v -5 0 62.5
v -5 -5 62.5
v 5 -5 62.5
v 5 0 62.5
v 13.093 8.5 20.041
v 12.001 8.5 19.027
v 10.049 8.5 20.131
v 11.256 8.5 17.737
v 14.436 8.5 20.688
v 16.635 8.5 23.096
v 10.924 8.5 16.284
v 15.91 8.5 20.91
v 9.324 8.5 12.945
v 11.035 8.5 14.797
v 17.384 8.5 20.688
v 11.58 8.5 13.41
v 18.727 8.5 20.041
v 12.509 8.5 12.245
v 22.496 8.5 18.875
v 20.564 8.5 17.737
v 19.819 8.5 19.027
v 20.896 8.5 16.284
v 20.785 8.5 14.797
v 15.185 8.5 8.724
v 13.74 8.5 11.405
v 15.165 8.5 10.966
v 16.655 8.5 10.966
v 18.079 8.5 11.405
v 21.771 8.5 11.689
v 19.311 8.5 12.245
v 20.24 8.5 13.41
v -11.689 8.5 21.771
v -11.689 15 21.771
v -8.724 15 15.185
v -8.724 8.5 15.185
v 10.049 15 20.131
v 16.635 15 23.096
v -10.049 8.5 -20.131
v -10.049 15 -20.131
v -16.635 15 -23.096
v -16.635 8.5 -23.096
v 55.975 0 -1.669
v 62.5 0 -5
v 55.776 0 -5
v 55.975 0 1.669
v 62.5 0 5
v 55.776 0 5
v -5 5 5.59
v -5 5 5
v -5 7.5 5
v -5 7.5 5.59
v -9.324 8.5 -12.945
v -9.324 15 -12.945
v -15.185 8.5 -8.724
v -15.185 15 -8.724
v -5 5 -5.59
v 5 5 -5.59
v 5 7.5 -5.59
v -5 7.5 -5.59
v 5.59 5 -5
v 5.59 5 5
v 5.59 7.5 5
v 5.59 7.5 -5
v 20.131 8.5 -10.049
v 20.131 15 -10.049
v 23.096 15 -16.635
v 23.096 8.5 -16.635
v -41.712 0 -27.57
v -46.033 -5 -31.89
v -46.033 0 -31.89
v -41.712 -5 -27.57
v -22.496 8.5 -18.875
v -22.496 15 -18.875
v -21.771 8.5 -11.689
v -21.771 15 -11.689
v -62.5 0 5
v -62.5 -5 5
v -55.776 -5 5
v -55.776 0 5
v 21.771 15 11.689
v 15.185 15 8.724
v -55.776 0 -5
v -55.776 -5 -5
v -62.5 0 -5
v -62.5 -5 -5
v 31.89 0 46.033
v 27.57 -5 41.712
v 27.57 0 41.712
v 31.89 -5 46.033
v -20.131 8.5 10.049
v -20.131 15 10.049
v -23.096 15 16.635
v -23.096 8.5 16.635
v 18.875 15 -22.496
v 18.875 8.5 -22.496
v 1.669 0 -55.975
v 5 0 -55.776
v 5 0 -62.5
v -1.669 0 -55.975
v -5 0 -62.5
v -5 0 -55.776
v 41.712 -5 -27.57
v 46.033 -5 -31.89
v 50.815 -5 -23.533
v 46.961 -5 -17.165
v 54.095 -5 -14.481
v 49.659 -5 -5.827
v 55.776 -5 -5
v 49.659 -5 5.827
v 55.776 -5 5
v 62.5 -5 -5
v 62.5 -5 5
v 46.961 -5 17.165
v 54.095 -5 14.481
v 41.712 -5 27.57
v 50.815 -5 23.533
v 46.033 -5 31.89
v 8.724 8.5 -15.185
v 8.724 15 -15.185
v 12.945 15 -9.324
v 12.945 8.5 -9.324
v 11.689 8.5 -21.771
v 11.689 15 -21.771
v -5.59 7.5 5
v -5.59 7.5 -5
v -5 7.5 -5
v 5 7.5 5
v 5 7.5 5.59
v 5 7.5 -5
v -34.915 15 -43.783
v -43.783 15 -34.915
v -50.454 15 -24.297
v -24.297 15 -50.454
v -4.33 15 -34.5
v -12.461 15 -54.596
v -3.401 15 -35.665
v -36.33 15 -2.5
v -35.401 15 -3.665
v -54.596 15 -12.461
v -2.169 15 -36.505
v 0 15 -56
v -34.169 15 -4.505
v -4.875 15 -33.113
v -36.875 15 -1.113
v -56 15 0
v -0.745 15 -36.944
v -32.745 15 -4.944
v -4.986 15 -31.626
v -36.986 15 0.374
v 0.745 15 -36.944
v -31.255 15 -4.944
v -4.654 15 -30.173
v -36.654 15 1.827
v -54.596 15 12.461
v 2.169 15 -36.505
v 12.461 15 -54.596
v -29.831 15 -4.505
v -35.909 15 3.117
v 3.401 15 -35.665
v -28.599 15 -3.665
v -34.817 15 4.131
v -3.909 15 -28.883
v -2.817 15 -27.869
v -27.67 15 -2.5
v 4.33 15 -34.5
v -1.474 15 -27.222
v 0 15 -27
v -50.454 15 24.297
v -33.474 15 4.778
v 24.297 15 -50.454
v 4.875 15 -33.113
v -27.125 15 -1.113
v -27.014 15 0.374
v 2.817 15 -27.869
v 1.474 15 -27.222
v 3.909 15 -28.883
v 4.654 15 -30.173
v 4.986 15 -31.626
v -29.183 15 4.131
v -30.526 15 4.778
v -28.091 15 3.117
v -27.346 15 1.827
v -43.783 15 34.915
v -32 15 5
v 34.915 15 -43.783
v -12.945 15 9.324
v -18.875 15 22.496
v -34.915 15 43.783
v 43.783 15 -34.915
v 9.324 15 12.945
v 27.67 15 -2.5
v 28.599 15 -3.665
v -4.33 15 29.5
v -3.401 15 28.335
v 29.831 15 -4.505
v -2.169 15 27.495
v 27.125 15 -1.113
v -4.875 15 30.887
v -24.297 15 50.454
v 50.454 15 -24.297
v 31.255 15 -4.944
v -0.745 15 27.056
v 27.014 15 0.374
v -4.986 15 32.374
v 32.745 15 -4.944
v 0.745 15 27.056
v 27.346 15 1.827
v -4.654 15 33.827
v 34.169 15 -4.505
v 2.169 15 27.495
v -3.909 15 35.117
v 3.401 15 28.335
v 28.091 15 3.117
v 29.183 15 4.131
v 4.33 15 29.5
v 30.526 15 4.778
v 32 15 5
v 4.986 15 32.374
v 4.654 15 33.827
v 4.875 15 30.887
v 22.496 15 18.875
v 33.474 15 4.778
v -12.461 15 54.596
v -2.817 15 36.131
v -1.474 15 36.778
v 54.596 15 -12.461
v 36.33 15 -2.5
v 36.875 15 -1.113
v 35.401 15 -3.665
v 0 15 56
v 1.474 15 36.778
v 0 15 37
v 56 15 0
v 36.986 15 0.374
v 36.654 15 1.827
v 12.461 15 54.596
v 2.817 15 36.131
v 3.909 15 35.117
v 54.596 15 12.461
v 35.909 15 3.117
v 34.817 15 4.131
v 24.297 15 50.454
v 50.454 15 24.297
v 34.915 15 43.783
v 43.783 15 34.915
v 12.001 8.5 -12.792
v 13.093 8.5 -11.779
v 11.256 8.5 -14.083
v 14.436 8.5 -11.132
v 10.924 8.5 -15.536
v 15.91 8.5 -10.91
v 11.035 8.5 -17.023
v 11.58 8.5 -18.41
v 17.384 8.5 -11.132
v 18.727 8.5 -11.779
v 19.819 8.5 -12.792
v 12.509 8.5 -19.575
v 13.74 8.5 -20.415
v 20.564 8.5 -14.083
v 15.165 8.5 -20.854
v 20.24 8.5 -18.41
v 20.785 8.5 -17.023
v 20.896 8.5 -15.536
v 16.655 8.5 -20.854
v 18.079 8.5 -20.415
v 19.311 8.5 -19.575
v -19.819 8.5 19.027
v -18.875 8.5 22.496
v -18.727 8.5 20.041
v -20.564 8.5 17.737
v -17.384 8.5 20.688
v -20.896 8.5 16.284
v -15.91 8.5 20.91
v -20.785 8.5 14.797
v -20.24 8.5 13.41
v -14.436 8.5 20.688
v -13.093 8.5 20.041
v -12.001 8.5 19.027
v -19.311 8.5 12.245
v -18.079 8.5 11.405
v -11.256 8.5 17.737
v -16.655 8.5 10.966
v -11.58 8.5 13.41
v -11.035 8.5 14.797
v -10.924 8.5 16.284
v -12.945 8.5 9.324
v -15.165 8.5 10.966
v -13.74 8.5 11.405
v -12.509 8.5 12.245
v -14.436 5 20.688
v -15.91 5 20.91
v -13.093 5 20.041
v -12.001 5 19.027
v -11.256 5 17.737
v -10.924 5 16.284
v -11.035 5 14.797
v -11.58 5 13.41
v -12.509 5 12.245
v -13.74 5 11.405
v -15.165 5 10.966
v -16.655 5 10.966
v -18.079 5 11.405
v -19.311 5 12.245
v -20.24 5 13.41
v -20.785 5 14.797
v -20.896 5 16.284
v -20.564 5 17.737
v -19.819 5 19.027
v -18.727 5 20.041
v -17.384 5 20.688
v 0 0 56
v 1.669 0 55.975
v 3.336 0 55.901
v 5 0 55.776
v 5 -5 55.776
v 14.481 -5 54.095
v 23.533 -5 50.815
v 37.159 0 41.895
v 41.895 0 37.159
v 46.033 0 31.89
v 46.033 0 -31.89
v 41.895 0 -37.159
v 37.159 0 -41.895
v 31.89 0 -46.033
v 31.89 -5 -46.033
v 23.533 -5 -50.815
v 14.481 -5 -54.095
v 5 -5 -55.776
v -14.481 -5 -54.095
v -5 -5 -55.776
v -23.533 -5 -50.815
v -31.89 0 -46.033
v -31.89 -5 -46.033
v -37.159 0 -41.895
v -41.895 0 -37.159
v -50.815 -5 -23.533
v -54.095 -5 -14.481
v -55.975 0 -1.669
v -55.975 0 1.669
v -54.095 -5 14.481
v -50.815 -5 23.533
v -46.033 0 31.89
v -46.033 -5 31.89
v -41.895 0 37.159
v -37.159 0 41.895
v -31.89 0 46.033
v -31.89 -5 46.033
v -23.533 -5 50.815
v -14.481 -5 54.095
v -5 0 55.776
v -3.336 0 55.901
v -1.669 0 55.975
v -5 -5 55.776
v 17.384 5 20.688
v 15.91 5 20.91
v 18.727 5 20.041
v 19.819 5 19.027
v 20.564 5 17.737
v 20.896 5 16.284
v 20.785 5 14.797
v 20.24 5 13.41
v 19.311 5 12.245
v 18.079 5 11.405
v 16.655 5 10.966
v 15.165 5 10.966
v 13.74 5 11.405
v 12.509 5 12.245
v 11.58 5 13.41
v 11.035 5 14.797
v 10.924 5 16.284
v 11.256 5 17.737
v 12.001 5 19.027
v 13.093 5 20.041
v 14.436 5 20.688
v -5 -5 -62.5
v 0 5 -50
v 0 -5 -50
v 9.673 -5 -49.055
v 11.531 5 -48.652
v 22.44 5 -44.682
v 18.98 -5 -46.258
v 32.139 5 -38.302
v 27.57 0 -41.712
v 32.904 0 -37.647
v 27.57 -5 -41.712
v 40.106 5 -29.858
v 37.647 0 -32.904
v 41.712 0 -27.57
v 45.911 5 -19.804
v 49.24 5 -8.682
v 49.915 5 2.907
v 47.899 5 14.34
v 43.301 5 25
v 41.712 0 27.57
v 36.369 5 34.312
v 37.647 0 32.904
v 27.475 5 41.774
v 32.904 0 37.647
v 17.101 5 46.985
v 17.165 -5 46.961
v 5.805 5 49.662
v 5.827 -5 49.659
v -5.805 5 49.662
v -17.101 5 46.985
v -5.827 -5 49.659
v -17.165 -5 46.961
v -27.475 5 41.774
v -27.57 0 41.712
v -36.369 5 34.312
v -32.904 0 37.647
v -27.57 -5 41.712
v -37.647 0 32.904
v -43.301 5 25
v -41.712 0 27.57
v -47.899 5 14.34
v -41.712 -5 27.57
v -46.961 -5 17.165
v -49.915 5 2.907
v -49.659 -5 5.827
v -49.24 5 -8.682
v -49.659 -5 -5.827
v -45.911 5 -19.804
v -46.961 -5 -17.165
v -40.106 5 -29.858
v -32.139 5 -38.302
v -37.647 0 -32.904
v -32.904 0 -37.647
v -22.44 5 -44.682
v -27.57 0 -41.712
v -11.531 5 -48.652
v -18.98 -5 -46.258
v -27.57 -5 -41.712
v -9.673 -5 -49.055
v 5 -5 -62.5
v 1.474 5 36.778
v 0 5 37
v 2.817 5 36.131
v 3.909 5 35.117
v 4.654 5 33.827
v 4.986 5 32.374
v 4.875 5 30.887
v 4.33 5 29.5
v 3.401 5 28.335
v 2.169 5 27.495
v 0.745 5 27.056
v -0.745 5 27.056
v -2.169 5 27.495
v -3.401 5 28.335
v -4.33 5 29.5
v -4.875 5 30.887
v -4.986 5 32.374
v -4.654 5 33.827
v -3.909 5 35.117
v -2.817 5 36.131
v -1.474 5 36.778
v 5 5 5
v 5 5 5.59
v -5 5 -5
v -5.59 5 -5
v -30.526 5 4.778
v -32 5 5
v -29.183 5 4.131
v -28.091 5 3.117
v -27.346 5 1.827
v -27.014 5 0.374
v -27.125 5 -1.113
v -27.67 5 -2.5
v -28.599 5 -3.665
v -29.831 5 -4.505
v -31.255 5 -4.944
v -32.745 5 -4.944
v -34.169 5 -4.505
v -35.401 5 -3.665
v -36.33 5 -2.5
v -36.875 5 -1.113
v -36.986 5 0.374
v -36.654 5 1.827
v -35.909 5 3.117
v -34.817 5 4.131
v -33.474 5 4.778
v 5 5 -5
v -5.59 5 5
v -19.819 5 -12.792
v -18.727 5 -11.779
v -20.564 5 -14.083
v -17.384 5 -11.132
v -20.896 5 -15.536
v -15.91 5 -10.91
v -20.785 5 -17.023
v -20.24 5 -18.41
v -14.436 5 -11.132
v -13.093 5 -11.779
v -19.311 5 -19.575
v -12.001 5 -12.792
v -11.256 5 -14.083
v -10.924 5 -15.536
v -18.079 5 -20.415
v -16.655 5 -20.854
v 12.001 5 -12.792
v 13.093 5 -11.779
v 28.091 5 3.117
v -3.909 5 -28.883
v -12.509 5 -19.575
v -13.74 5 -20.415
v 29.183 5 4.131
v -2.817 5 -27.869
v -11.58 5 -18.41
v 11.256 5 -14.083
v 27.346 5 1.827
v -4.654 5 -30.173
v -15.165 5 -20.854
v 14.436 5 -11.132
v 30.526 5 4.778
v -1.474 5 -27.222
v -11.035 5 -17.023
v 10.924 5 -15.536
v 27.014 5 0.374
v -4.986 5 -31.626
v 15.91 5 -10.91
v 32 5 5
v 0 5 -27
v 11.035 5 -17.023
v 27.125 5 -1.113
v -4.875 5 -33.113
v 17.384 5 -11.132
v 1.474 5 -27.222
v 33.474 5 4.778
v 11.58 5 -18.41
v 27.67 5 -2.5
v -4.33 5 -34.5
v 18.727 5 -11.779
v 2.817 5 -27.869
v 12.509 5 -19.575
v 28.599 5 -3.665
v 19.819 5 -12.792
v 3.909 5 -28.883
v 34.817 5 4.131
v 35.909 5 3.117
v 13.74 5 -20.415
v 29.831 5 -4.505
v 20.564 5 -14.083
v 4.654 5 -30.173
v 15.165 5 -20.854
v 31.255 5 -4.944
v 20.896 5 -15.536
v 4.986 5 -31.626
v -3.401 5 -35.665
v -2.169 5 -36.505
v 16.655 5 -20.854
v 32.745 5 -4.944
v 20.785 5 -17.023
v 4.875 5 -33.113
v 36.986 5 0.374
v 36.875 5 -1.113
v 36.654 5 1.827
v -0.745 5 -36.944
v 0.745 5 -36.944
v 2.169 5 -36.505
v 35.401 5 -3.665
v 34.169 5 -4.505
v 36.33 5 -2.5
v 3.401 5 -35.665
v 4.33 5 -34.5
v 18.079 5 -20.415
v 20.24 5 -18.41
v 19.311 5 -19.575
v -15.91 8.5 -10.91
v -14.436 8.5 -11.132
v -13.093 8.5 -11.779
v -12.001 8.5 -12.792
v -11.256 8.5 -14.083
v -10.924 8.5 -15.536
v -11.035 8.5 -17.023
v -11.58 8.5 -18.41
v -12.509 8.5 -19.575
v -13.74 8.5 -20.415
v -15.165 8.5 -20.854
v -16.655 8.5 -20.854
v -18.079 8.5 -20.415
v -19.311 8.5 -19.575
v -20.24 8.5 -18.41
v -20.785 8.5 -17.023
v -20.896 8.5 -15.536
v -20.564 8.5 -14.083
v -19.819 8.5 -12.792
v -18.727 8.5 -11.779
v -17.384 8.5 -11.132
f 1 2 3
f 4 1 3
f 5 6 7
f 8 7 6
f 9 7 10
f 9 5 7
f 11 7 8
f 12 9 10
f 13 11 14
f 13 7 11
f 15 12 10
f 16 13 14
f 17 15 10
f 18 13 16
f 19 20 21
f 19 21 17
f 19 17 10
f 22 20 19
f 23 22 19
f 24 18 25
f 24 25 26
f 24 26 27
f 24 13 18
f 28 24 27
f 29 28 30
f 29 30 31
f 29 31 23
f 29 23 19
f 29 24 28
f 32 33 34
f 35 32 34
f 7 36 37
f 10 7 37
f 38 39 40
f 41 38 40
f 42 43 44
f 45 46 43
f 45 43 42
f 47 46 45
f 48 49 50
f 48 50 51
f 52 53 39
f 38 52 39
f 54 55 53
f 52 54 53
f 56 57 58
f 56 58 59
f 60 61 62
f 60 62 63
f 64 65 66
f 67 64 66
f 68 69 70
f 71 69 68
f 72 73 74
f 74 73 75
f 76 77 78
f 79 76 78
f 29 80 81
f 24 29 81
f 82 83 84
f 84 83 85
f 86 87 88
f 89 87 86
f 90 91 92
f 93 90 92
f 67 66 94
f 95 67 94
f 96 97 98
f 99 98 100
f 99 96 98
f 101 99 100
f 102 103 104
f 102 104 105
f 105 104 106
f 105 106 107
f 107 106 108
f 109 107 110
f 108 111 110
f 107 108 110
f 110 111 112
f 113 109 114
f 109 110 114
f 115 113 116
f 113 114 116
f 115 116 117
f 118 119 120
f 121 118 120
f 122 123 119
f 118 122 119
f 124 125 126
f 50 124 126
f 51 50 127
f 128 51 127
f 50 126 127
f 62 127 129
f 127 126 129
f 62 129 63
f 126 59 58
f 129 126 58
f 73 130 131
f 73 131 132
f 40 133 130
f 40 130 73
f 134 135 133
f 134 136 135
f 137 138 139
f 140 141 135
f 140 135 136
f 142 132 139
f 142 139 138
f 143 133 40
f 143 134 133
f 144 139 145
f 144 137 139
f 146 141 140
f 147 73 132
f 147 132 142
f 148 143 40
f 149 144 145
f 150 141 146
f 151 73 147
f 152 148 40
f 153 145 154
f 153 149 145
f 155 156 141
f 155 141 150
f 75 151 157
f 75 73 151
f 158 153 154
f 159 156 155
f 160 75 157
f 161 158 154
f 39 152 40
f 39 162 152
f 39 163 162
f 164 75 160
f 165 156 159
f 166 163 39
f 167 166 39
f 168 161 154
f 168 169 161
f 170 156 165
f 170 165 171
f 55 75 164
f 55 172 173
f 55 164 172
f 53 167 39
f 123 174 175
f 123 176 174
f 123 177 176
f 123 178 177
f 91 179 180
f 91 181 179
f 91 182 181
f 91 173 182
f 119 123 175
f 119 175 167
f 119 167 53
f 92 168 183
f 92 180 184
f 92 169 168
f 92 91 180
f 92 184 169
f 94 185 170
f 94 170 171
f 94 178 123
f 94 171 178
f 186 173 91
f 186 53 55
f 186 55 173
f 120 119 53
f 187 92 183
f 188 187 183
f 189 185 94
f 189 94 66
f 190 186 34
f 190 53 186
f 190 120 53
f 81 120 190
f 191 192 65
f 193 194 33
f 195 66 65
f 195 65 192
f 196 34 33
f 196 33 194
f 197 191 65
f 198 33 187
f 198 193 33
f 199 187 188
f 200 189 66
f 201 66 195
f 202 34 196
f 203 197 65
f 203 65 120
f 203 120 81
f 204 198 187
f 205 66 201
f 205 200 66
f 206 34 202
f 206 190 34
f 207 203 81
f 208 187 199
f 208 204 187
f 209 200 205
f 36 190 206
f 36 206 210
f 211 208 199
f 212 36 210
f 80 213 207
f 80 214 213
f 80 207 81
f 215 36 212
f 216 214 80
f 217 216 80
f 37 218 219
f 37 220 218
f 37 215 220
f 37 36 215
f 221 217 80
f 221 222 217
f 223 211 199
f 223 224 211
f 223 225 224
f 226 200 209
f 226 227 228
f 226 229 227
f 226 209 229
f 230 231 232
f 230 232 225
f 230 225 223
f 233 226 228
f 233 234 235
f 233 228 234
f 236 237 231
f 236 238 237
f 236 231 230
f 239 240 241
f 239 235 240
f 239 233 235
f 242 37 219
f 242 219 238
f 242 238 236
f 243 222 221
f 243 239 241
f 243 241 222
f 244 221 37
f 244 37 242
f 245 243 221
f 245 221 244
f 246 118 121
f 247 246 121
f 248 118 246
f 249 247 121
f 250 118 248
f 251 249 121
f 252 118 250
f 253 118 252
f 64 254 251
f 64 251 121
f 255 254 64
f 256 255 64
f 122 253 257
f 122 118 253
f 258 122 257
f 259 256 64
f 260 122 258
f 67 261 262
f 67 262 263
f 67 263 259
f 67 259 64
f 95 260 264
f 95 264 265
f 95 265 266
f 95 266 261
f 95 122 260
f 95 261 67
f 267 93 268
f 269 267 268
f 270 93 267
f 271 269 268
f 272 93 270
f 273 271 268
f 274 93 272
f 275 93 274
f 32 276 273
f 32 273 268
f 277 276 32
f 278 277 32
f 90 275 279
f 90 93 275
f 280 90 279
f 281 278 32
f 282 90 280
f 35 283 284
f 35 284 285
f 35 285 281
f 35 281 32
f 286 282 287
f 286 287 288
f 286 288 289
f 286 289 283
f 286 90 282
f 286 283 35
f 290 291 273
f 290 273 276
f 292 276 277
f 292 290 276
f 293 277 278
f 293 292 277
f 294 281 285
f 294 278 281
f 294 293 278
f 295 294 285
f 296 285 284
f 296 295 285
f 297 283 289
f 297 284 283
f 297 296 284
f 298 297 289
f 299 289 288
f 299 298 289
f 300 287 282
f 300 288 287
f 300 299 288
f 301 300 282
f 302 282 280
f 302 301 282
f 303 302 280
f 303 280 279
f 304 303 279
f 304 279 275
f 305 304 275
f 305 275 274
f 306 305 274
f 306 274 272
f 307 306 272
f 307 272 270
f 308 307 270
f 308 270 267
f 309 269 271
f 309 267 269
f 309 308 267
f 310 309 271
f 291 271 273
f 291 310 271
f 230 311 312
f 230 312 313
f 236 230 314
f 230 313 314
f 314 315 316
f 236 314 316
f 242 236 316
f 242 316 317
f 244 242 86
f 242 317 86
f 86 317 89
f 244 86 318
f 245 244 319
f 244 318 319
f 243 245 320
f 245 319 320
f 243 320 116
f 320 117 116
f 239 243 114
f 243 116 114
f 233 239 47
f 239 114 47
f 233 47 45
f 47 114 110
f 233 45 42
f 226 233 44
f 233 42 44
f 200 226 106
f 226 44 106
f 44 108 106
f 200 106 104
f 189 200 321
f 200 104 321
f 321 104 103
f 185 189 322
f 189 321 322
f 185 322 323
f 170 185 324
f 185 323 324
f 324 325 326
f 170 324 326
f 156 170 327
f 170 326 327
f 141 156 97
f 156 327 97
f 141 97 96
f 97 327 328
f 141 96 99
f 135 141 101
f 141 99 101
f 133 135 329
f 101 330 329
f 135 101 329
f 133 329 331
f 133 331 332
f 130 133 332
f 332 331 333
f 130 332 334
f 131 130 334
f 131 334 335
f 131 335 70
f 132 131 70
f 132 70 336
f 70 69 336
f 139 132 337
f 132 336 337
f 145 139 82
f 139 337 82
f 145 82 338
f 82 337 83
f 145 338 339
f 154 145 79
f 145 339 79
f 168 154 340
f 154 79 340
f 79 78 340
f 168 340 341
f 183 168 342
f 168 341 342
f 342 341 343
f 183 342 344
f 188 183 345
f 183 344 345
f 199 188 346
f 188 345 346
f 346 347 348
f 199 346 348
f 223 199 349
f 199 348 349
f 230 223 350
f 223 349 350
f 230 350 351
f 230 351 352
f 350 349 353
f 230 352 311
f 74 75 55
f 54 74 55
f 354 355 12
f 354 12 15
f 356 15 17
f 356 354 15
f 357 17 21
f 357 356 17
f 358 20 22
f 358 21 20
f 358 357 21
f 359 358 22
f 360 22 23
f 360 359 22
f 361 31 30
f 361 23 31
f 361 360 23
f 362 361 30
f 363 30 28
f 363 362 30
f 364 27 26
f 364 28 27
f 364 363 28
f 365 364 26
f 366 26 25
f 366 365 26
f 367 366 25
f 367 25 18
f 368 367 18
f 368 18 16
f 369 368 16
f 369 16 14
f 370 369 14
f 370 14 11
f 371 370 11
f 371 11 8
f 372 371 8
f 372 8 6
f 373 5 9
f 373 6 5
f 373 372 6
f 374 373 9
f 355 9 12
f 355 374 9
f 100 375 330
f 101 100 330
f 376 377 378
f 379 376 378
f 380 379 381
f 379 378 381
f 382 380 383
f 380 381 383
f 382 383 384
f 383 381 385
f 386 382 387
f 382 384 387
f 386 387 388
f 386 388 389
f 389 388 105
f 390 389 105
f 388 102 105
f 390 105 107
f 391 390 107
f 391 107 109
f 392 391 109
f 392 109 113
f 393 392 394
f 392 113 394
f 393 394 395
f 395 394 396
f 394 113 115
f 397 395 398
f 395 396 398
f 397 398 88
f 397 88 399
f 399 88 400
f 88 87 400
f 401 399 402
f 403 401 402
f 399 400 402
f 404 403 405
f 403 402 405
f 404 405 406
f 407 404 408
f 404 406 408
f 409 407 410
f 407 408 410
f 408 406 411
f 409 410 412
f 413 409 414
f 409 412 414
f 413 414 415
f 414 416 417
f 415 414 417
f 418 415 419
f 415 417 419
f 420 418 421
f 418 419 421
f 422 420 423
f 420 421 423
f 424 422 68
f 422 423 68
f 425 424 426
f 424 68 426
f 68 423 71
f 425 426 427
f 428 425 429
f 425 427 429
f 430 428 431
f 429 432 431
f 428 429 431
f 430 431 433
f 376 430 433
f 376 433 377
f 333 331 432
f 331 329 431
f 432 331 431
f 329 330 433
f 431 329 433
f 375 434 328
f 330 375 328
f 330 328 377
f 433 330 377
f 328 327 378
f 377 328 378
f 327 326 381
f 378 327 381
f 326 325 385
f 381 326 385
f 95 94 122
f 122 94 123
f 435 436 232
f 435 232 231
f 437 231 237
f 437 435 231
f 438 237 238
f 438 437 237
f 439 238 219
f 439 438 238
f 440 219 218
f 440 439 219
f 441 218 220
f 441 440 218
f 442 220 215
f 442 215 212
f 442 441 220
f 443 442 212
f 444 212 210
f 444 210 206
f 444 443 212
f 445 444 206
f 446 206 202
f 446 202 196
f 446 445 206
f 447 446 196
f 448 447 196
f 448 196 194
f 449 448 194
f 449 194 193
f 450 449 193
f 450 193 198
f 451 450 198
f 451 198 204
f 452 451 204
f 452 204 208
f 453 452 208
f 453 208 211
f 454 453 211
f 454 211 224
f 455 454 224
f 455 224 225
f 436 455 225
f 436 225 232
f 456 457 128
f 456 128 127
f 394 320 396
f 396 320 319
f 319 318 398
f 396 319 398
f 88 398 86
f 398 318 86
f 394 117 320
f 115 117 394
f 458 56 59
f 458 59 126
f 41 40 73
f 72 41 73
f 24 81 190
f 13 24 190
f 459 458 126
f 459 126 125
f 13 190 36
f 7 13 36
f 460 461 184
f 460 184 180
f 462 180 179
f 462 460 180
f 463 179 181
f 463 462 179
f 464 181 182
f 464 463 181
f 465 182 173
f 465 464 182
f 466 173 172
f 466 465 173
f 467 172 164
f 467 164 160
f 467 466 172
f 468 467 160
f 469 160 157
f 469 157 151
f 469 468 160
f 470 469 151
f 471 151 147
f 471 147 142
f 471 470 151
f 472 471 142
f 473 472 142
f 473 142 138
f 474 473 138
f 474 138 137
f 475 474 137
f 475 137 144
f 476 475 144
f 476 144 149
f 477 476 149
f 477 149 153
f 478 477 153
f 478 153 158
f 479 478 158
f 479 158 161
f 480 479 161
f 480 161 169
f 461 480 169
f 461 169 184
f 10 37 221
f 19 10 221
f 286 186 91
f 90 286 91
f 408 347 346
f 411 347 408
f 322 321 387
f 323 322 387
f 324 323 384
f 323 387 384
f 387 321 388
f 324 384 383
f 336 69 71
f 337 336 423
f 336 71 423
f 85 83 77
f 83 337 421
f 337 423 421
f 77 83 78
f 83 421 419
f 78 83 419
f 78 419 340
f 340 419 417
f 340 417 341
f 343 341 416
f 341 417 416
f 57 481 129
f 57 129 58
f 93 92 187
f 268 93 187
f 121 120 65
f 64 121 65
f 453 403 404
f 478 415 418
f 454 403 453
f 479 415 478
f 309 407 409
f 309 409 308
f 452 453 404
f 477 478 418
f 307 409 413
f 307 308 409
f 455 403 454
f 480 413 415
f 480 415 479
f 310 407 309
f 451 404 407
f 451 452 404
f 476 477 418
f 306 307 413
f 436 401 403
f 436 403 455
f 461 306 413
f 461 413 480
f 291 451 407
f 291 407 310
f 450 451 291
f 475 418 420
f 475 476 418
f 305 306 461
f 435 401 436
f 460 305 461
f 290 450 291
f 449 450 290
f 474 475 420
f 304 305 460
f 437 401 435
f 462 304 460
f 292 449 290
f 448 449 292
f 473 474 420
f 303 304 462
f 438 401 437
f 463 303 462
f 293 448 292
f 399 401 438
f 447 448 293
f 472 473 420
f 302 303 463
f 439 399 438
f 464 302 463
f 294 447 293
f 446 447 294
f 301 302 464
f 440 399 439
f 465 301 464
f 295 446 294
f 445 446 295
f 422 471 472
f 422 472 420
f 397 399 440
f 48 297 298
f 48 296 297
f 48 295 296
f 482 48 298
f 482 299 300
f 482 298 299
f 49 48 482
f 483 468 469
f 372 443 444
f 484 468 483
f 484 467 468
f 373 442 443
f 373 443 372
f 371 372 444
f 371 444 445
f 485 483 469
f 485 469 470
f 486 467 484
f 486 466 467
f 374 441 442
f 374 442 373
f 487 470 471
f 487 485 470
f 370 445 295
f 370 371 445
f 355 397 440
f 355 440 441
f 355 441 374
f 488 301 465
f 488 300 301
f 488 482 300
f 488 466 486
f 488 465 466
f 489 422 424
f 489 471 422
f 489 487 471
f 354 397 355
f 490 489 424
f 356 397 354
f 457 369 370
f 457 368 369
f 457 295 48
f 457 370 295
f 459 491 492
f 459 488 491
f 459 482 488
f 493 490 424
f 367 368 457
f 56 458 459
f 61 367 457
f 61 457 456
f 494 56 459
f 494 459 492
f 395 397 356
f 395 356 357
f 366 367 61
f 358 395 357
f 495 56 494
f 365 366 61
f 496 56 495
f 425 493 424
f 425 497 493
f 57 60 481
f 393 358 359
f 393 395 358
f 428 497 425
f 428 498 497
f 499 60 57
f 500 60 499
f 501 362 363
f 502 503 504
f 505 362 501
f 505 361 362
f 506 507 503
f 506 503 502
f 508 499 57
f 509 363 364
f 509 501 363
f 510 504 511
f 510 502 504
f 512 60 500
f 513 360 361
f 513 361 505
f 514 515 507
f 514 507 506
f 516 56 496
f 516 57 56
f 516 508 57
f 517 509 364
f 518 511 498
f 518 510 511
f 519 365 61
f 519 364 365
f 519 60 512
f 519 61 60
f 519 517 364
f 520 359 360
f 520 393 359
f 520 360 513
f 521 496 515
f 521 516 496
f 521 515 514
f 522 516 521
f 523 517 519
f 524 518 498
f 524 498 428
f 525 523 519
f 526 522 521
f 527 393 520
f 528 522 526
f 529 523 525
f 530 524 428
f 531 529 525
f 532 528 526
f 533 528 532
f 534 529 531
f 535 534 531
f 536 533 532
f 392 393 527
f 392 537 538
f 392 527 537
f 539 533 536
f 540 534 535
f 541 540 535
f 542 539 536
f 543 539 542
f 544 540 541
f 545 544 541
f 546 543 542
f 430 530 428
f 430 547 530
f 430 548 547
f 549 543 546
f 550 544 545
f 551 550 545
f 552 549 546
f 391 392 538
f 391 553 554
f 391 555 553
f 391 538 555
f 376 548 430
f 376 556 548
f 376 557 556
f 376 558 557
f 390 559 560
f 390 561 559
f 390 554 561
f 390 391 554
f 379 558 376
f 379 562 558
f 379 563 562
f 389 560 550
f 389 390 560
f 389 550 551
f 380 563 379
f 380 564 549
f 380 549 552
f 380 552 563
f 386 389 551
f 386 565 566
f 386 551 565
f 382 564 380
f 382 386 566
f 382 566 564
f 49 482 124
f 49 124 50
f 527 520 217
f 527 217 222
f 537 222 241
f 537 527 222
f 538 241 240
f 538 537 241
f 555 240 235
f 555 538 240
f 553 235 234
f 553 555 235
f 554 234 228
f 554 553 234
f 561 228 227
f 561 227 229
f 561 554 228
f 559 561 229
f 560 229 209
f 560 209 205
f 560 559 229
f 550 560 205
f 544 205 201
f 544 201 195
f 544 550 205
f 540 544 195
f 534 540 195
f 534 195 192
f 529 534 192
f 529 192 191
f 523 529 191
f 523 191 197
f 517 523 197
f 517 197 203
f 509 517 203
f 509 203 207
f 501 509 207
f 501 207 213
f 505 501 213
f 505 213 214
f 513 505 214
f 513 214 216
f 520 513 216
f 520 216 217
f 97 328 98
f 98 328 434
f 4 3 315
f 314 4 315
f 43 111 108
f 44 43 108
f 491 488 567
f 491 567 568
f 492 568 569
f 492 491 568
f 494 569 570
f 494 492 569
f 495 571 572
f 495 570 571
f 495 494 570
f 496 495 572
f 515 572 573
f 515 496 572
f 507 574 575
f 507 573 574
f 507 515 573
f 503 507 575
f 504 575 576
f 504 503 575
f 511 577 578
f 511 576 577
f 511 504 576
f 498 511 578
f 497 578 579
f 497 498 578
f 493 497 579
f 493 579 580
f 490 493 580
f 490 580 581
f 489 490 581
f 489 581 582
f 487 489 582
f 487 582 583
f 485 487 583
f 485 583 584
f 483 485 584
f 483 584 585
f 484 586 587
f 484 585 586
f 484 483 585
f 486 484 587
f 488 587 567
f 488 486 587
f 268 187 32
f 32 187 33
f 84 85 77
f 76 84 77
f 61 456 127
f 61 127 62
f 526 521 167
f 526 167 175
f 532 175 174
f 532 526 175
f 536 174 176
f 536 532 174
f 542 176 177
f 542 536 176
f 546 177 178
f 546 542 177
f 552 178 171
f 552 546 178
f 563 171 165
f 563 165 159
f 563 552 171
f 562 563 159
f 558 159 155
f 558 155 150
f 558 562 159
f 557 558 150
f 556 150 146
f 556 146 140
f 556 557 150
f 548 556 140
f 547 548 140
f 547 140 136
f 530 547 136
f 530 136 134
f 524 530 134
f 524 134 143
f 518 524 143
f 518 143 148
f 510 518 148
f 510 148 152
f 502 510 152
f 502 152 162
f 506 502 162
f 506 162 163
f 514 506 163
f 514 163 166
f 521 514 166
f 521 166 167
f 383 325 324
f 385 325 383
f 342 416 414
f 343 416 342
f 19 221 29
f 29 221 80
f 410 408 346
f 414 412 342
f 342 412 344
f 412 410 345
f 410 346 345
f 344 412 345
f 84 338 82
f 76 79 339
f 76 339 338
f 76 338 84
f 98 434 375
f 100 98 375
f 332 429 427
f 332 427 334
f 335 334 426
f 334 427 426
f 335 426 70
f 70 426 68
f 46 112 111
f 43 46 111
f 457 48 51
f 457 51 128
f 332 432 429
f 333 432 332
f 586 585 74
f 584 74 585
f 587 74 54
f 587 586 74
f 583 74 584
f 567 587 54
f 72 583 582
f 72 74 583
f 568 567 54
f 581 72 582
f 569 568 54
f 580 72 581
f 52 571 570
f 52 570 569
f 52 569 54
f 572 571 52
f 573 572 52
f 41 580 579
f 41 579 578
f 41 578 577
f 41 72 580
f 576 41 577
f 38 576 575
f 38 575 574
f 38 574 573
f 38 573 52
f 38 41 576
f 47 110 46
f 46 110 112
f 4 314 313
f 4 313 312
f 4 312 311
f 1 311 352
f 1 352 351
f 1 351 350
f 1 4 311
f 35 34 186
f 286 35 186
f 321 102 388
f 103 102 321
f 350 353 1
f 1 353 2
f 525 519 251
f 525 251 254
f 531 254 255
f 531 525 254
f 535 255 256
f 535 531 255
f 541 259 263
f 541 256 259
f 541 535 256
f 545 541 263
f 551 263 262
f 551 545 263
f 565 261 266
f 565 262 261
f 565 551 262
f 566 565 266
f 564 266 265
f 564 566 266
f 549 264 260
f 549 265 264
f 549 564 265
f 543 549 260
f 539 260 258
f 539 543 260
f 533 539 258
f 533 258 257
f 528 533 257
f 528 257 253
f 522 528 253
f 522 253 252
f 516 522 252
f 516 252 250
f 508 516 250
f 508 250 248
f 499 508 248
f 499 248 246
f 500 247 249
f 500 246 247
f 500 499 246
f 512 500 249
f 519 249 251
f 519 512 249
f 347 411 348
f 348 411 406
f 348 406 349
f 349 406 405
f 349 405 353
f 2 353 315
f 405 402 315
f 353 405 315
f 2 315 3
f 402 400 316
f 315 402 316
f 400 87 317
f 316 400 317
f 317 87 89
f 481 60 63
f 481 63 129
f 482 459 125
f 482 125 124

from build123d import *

# Parameters (mm, degrees)
BOSS_EXTRUDE1_DEPTH      = 15
BOSS_EXTRUDE1_DEPTH_BACK = 5
SKETCH1_R                = 56
SKETCH1_R_2              = 5
BOSS_EXTRUDE3_DEPTH      = 5
SKETCH4_R                = 50
CUT_EXTRUDE1_DEPTH       = 10
CUT_EXTRUDE2_DEPTH       = 5
CUT_EXTRUDE5_START       = -10
CUT_EXTRUDE5_DEPTH       = 2.5
CUT_EXTRUDE6_DEPTH       = 6.5


with BuildPart() as part:
    # Sketch1 → Boss-Extrude1 (new, two sides: drawn at the far end of the back side and taken through both)
    with BuildSketch(Plane(origin=(0, 0, 0), x_dir=(1, 0, 0), z_dir=(0, 1, 0)).offset(-BOSS_EXTRUDE1_DEPTH_BACK)):
        with Locations(Location((0, 0, 0), (0, 0, 270))):
            Circle(SKETCH1_R)
        with Locations(Location((15.909902577, 15.909902577, 0), (0, 0, 270))):
            Circle(SKETCH1_R_2, mode=Mode.SUBTRACT)
        with Locations(Location((15.909902577, -15.909902577, 0), (0, 0, 270))):
            Circle(SKETCH1_R_2, mode=Mode.SUBTRACT)
        with Locations(Location((-15.909902577, -15.909902577, 0), (0, 0, 270))):
            Circle(SKETCH1_R_2, mode=Mode.SUBTRACT)
        with Locations(Location((-15.909902577, 15.909902577, 0), (0, 0, 270))):
            Circle(SKETCH1_R_2, mode=Mode.SUBTRACT)
        with Locations(Location((-32, 0, 0), (0, 0, 270))):
            Circle(SKETCH1_R_2, mode=Mode.SUBTRACT)
        with Locations(Location((0, 32, 0), (0, 0, 270))):
            Circle(SKETCH1_R_2, mode=Mode.SUBTRACT)
        with Locations(Location((32, 0, 0), (0, 0, 270))):
            Circle(SKETCH1_R_2, mode=Mode.SUBTRACT)
        with Locations(Location((0, -32, 0), (0, 0, 270))):
            Circle(SKETCH1_R_2, mode=Mode.SUBTRACT)
    extrude(amount=BOSS_EXTRUDE1_DEPTH + BOSS_EXTRUDE1_DEPTH_BACK)

    # Sketch3 → Boss-Extrude3 (add)
    with BuildSketch(Plane.XZ.offset(5)):
        Polygon((-5, 5), (-5, 62.5), (5, 62.5), (5, 5), (62.5, 5), (62.5, -5), (5, -5), (5, -62.5), (-5, -62.5), (-5, -5), (-62.5, -5), (-62.5, 5), align=None)
    extrude(amount=-BOSS_EXTRUDE3_DEPTH)

    # Sketch4 → Cut-Extrude1 (cut)
    with BuildSketch(Plane.XZ.offset(5)):
        with Locations(Location((0, 0, 0), (0, 0, 270))):
            Circle(SKETCH4_R)
    extrude(amount=-CUT_EXTRUDE1_DEPTH, mode=Mode.SUBTRACT)

    # Sketch5 → Cut-Extrude2 (cut)
    with BuildSketch(Plane.XZ.offset(5)):
        with BuildLine():
            Line((27.56994834, 41.712083963), (31.890451666, 46.032587289))
            ThreePointArc((31.890451666, 46.032587289), (39.597979746, 39.597979746), (46.032587289, 31.890451666))
            Line((46.032587289, 31.890451666), (41.712083963, 27.56994834))
            ThreePointArc((41.712083963, 27.56994834), (35.355339059, 35.355339059), (27.56994834, 41.712083963))
        make_face()
        with BuildLine():
            Line((41.712083963, -27.56994834), (46.032587289, -31.890451666))
            ThreePointArc((46.032587289, -31.890451666), (39.597979746, -39.597979746), (31.890451666, -46.032587289))
            Line((31.890451666, -46.032587289), (27.56994834, -41.712083963))
            ThreePointArc((27.56994834, -41.712083963), (35.355339059, -35.355339059), (41.712083963, -27.56994834))
        make_face()
        with BuildLine():
            Line((-27.56994834, -41.712083963), (-31.890451666, -46.032587289))
            ThreePointArc((-31.890451666, -46.032587289), (-39.597979746, -39.597979746), (-46.032587289, -31.890451666))
            Line((-46.032587289, -31.890451666), (-41.712083963, -27.56994834))
            ThreePointArc((-41.712083963, -27.56994834), (-35.355339059, -35.355339059), (-27.56994834, -41.712083963))
        make_face()
        with BuildLine():
            Line((-41.712083963, 27.56994834), (-46.032587289, 31.890451666))
            ThreePointArc((-46.032587289, 31.890451666), (-39.597979746, 39.597979746), (-31.890451666, 46.032587289))
            Line((-31.890451666, 46.032587289), (-27.56994834, 41.712083963))
            ThreePointArc((-27.56994834, 41.712083963), (-35.355339059, 35.355339059), (-41.712083963, 27.56994834))
        make_face()
    extrude(amount=-CUT_EXTRUDE2_DEPTH, mode=Mode.SUBTRACT)

    # Sketch8 → Cut-Extrude5 (cut)
    with BuildSketch(Plane(origin=(0, 15, 0), x_dir=(1, 0, 0), z_dir=(0, 1, 0)).offset(CUT_EXTRUDE5_START)):
        Polygon((-5, 5), (-5.590169944, 5), (-5.590169944, -5), (-5, -5), (-5, -5.590169944), (5, -5.590169944), (5, -5), (5.590169944, -5), (5.590169944, 5), (5, 5), (5, 5.590169944), (-5, 5.590169944), align=None)
    extrude(amount=CUT_EXTRUDE5_DEPTH, mode=Mode.SUBTRACT)

    # Sketch10 → Cut-Extrude6 (cut)
    with BuildSketch(Plane(origin=(0, 15, 0), x_dir=(1, 0, 0), z_dir=(0, 1, 0))):
        Polygon((11.688650249, 21.770596118), (8.723766922, 15.184537596), (12.94501925, 9.323844055), (20.131154904, 10.049209035), (23.096038231, 16.635267557), (18.874785904, 22.495961099), align=None)
        Polygon((-16.635267557, 23.096038231), (-22.495961099, 18.874785904), (-21.770596118, 11.688650249), (-15.184537596, 8.723766922), (-9.323844055, 12.94501925), (-10.049209035, 20.131154904), align=None)
        Polygon((21.770596118, -11.688650249), (15.184537596, -8.723766922), (9.323844055, -12.94501925), (10.049209035, -20.131154904), (16.635267557, -23.096038231), (22.495961099, -18.874785904), align=None)
        Polygon((-11.688650249, -21.770596118), (-8.723766922, -15.184537596), (-12.94501925, -9.323844055), (-20.131154904, -10.049209035), (-23.096038231, -16.635267557), (-18.874785904, -22.495961099), align=None)
    extrude(amount=-CUT_EXTRUDE6_DEPTH, mode=Mode.SUBTRACT)


solid = part.part
